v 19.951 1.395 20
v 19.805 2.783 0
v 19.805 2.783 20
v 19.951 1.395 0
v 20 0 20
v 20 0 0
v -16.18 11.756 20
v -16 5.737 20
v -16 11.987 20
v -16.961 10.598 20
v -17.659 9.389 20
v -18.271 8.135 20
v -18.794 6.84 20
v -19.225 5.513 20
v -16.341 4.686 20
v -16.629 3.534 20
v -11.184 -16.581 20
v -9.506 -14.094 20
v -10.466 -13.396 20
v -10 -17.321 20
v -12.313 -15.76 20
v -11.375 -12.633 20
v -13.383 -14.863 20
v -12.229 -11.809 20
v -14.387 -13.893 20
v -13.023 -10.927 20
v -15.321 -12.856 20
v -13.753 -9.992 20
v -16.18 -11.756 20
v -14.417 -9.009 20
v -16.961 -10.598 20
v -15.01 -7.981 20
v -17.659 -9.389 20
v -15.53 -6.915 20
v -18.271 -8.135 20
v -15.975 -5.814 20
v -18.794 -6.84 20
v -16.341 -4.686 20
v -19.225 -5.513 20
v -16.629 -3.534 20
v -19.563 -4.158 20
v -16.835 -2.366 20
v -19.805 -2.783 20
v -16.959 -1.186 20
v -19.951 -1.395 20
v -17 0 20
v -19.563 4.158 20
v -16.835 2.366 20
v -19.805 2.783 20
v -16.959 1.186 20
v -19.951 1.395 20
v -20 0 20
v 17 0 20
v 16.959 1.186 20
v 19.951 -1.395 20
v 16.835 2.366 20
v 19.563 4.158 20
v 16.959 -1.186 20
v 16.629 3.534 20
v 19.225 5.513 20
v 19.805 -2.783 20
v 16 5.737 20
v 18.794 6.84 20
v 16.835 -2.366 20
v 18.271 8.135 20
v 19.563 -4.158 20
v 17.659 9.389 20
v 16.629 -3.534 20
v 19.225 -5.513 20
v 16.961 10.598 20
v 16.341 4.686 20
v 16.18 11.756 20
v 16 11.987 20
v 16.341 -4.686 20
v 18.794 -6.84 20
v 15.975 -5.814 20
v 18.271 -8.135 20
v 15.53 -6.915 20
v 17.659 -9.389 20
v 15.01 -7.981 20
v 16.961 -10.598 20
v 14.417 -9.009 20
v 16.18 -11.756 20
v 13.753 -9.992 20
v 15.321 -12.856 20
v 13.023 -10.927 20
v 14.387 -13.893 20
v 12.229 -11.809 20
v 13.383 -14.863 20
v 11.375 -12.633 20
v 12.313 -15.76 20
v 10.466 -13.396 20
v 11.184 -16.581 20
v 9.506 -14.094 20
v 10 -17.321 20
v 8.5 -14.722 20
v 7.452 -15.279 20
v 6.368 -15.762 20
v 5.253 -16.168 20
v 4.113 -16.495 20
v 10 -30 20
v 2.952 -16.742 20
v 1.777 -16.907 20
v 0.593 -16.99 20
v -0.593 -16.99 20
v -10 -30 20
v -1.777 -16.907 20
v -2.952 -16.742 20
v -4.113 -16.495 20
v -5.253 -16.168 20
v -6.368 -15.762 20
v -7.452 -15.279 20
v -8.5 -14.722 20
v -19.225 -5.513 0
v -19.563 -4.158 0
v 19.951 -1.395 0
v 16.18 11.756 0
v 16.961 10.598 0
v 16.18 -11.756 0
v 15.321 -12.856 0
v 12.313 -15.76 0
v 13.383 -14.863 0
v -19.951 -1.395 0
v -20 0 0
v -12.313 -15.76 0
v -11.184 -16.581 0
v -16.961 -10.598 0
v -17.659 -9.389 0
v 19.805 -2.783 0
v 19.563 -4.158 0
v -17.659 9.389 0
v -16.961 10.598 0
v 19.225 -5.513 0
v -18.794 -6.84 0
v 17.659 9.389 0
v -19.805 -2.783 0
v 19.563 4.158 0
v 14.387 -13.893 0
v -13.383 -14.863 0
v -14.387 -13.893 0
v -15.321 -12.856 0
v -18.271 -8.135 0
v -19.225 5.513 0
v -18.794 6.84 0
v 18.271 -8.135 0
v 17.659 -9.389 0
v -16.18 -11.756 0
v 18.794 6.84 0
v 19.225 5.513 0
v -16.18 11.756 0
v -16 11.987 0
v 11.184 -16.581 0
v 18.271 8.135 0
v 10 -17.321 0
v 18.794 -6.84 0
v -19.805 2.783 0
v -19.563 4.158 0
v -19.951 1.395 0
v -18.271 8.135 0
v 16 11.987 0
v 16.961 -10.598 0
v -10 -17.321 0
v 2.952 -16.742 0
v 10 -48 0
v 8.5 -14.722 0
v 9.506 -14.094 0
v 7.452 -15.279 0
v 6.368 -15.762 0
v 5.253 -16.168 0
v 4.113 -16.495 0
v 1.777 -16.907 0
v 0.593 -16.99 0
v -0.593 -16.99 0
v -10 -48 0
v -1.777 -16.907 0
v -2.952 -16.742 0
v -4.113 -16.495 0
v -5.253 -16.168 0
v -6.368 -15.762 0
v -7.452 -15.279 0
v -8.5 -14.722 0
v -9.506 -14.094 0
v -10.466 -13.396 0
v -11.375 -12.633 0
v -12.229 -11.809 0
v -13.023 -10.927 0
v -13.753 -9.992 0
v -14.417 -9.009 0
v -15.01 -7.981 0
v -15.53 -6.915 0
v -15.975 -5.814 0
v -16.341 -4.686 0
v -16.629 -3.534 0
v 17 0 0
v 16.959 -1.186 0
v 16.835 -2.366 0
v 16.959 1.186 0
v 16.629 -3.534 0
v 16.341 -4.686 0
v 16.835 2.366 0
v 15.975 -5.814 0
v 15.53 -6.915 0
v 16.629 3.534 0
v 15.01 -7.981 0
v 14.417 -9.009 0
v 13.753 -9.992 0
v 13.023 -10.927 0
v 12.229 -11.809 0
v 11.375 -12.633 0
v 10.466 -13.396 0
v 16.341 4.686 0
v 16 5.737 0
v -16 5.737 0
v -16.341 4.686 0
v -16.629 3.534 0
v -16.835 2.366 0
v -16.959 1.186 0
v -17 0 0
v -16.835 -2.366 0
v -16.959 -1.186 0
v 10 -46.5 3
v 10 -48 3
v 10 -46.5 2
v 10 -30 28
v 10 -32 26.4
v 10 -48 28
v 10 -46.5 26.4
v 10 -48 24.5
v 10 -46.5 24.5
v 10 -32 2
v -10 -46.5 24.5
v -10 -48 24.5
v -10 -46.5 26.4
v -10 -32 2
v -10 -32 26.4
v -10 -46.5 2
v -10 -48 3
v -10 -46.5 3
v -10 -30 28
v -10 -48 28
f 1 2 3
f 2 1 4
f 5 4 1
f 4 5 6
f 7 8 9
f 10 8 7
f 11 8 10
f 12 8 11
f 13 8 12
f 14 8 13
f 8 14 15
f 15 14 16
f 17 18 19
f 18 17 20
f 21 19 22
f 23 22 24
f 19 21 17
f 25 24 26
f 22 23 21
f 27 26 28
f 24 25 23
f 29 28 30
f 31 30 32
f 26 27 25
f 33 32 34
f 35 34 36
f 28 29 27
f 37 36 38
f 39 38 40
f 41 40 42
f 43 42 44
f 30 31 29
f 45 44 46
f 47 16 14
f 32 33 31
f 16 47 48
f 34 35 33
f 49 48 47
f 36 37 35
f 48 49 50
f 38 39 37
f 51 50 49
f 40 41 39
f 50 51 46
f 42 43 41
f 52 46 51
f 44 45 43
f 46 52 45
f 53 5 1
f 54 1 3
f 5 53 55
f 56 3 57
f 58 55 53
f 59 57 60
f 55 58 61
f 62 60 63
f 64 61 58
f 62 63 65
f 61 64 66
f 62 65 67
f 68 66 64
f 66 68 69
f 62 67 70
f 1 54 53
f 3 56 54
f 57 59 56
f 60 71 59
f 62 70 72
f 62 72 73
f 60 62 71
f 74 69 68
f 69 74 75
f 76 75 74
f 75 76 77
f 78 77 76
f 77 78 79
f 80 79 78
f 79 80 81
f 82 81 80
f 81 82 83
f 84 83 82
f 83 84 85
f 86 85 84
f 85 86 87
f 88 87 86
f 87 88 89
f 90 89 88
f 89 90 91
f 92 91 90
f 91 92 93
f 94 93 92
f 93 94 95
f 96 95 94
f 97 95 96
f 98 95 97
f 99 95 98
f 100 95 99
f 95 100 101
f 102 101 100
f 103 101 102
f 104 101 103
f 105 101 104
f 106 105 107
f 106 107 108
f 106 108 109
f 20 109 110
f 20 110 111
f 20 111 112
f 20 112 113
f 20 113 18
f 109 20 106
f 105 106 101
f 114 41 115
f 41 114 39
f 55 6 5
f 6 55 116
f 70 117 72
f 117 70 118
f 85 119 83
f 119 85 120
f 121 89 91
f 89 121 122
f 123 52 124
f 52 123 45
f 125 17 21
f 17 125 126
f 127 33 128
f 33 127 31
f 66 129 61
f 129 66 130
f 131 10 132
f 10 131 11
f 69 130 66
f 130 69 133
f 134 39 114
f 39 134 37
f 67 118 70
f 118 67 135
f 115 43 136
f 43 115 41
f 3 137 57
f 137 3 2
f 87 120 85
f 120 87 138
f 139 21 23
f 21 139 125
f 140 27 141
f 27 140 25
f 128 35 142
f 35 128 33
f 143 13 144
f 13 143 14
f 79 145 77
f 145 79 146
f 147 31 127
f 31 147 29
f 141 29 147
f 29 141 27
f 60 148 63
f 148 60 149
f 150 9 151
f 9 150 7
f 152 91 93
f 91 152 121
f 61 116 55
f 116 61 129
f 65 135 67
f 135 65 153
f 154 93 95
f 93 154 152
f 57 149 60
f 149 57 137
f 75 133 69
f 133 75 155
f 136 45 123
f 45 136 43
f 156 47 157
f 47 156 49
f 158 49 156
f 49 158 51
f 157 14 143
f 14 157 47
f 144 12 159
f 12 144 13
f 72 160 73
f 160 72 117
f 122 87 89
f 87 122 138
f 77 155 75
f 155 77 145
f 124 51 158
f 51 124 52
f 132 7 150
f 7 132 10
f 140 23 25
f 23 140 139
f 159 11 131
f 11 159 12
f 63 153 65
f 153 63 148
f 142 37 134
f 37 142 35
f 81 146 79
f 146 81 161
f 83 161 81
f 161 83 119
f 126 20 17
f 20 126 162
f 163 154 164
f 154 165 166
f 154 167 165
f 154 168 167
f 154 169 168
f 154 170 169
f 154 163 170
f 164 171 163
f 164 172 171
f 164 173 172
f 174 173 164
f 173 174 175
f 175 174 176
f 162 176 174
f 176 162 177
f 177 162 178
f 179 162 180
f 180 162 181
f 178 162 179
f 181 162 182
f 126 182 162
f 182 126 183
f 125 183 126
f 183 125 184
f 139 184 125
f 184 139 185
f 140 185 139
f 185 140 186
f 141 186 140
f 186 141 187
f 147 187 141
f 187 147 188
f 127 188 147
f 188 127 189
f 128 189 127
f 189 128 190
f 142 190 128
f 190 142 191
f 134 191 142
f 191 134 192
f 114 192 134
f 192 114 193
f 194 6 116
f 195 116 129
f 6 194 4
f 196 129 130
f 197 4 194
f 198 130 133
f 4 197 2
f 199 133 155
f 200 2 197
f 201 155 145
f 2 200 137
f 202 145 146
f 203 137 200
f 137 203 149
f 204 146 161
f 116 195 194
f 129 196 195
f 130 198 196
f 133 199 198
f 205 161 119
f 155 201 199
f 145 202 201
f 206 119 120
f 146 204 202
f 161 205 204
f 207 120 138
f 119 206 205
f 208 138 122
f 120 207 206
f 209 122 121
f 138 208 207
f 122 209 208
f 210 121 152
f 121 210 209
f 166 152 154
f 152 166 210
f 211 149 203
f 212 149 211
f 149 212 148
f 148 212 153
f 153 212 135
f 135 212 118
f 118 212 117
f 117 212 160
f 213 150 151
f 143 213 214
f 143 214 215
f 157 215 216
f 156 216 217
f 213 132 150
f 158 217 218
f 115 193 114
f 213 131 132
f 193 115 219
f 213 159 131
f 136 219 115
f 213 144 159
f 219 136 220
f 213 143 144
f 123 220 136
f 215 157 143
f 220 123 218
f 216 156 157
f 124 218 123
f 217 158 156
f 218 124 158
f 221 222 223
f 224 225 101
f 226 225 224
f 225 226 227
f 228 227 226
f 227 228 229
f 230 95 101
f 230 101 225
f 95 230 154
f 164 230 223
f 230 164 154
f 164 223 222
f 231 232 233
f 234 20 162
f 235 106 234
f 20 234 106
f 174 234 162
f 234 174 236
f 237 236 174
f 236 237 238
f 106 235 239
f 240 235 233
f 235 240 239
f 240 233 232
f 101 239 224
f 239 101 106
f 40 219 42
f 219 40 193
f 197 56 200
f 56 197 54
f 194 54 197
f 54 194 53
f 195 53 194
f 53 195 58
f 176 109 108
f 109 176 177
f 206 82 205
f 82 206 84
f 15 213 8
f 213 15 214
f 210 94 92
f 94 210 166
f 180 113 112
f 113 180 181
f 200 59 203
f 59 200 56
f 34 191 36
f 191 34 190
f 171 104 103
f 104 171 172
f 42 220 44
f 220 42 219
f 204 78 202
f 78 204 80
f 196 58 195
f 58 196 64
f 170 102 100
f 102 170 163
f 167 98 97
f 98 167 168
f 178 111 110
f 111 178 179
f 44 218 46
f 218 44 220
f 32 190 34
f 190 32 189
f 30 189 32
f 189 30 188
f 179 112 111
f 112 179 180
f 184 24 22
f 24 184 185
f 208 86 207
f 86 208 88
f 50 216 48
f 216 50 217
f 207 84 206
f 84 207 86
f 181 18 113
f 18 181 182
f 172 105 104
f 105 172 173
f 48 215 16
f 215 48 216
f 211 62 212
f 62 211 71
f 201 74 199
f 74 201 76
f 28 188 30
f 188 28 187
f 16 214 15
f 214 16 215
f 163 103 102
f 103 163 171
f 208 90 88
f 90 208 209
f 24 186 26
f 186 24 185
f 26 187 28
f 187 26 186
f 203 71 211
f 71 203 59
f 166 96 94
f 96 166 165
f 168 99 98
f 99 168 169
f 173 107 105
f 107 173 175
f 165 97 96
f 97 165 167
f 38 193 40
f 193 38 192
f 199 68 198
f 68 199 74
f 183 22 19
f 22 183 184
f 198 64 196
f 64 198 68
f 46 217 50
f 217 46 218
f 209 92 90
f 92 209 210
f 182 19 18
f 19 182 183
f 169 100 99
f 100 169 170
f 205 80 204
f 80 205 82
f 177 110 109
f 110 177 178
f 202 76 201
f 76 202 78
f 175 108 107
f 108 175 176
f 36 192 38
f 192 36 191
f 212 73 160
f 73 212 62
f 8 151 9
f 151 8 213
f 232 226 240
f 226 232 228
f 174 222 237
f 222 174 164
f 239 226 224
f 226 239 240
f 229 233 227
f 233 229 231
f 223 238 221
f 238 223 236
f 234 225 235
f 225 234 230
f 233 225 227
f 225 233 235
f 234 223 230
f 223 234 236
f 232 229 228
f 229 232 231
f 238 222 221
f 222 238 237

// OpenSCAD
$fn = 90;

d = 34;

// mount
difference() {
    translate([0, 0, 0]) {
        cylinder(d = d + 6, h = 20);
        translate([-10, -30, 0]) cube([20, 15, 20]);
    }
    translate([0, 0, -1]) cylinder(d = d, h = 22);
    translate([-16, 0, -1]) cube([32, 24, 30]); 
}

// clamp
translate([-24, -32, 2]) rotate([90, 0, 0]) difference() {
    translate([14, -2, -2]) cube([20, 28, 18]);
    cube([48.2, 24.4, 14.5]);
    translate([0, 1, 4]) cube([48.2, 21.5, 13.7]);  
}
